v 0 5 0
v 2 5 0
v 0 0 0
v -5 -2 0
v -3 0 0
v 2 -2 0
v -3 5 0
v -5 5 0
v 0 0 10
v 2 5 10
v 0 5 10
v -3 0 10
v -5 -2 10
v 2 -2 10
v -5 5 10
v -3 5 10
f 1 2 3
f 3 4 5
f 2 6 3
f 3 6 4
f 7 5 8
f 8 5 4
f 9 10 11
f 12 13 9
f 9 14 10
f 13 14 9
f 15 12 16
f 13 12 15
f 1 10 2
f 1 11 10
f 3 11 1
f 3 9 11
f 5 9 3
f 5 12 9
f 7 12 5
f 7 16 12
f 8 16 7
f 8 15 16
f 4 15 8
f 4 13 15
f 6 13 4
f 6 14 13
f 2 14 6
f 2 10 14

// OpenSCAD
// customizable laptop camera cover
// @author Ilya Protasov

/*
TODO
- front radius
- thickness radius
*/

inner_depth = 3;
inner_height = 5;
width = 10;
thick = 2; // [0.2:0.1:10]
//frontRadiusA = 2;

$fn = 72;

module profile(inDepth, inH, width, thick) {
    polygon( points=[
        // front
        [0,0], [0,inH],
        [thick, inH],
        [thick, 0-thick],
        // top outer
        [-inDepth-thick, 0-thick],
        // back outer
        [-inDepth-thick, inH],
        [-inDepth, inH],
        [-inDepth, 0]] );  
}

module cover(inDepth, inH, width, thick) {
    color("DeepSkyBlue")
    linear_extrude(width)
        profile(inDepth, inH, width, thick);
}

cover(inner_depth, inner_height, width, thick);
